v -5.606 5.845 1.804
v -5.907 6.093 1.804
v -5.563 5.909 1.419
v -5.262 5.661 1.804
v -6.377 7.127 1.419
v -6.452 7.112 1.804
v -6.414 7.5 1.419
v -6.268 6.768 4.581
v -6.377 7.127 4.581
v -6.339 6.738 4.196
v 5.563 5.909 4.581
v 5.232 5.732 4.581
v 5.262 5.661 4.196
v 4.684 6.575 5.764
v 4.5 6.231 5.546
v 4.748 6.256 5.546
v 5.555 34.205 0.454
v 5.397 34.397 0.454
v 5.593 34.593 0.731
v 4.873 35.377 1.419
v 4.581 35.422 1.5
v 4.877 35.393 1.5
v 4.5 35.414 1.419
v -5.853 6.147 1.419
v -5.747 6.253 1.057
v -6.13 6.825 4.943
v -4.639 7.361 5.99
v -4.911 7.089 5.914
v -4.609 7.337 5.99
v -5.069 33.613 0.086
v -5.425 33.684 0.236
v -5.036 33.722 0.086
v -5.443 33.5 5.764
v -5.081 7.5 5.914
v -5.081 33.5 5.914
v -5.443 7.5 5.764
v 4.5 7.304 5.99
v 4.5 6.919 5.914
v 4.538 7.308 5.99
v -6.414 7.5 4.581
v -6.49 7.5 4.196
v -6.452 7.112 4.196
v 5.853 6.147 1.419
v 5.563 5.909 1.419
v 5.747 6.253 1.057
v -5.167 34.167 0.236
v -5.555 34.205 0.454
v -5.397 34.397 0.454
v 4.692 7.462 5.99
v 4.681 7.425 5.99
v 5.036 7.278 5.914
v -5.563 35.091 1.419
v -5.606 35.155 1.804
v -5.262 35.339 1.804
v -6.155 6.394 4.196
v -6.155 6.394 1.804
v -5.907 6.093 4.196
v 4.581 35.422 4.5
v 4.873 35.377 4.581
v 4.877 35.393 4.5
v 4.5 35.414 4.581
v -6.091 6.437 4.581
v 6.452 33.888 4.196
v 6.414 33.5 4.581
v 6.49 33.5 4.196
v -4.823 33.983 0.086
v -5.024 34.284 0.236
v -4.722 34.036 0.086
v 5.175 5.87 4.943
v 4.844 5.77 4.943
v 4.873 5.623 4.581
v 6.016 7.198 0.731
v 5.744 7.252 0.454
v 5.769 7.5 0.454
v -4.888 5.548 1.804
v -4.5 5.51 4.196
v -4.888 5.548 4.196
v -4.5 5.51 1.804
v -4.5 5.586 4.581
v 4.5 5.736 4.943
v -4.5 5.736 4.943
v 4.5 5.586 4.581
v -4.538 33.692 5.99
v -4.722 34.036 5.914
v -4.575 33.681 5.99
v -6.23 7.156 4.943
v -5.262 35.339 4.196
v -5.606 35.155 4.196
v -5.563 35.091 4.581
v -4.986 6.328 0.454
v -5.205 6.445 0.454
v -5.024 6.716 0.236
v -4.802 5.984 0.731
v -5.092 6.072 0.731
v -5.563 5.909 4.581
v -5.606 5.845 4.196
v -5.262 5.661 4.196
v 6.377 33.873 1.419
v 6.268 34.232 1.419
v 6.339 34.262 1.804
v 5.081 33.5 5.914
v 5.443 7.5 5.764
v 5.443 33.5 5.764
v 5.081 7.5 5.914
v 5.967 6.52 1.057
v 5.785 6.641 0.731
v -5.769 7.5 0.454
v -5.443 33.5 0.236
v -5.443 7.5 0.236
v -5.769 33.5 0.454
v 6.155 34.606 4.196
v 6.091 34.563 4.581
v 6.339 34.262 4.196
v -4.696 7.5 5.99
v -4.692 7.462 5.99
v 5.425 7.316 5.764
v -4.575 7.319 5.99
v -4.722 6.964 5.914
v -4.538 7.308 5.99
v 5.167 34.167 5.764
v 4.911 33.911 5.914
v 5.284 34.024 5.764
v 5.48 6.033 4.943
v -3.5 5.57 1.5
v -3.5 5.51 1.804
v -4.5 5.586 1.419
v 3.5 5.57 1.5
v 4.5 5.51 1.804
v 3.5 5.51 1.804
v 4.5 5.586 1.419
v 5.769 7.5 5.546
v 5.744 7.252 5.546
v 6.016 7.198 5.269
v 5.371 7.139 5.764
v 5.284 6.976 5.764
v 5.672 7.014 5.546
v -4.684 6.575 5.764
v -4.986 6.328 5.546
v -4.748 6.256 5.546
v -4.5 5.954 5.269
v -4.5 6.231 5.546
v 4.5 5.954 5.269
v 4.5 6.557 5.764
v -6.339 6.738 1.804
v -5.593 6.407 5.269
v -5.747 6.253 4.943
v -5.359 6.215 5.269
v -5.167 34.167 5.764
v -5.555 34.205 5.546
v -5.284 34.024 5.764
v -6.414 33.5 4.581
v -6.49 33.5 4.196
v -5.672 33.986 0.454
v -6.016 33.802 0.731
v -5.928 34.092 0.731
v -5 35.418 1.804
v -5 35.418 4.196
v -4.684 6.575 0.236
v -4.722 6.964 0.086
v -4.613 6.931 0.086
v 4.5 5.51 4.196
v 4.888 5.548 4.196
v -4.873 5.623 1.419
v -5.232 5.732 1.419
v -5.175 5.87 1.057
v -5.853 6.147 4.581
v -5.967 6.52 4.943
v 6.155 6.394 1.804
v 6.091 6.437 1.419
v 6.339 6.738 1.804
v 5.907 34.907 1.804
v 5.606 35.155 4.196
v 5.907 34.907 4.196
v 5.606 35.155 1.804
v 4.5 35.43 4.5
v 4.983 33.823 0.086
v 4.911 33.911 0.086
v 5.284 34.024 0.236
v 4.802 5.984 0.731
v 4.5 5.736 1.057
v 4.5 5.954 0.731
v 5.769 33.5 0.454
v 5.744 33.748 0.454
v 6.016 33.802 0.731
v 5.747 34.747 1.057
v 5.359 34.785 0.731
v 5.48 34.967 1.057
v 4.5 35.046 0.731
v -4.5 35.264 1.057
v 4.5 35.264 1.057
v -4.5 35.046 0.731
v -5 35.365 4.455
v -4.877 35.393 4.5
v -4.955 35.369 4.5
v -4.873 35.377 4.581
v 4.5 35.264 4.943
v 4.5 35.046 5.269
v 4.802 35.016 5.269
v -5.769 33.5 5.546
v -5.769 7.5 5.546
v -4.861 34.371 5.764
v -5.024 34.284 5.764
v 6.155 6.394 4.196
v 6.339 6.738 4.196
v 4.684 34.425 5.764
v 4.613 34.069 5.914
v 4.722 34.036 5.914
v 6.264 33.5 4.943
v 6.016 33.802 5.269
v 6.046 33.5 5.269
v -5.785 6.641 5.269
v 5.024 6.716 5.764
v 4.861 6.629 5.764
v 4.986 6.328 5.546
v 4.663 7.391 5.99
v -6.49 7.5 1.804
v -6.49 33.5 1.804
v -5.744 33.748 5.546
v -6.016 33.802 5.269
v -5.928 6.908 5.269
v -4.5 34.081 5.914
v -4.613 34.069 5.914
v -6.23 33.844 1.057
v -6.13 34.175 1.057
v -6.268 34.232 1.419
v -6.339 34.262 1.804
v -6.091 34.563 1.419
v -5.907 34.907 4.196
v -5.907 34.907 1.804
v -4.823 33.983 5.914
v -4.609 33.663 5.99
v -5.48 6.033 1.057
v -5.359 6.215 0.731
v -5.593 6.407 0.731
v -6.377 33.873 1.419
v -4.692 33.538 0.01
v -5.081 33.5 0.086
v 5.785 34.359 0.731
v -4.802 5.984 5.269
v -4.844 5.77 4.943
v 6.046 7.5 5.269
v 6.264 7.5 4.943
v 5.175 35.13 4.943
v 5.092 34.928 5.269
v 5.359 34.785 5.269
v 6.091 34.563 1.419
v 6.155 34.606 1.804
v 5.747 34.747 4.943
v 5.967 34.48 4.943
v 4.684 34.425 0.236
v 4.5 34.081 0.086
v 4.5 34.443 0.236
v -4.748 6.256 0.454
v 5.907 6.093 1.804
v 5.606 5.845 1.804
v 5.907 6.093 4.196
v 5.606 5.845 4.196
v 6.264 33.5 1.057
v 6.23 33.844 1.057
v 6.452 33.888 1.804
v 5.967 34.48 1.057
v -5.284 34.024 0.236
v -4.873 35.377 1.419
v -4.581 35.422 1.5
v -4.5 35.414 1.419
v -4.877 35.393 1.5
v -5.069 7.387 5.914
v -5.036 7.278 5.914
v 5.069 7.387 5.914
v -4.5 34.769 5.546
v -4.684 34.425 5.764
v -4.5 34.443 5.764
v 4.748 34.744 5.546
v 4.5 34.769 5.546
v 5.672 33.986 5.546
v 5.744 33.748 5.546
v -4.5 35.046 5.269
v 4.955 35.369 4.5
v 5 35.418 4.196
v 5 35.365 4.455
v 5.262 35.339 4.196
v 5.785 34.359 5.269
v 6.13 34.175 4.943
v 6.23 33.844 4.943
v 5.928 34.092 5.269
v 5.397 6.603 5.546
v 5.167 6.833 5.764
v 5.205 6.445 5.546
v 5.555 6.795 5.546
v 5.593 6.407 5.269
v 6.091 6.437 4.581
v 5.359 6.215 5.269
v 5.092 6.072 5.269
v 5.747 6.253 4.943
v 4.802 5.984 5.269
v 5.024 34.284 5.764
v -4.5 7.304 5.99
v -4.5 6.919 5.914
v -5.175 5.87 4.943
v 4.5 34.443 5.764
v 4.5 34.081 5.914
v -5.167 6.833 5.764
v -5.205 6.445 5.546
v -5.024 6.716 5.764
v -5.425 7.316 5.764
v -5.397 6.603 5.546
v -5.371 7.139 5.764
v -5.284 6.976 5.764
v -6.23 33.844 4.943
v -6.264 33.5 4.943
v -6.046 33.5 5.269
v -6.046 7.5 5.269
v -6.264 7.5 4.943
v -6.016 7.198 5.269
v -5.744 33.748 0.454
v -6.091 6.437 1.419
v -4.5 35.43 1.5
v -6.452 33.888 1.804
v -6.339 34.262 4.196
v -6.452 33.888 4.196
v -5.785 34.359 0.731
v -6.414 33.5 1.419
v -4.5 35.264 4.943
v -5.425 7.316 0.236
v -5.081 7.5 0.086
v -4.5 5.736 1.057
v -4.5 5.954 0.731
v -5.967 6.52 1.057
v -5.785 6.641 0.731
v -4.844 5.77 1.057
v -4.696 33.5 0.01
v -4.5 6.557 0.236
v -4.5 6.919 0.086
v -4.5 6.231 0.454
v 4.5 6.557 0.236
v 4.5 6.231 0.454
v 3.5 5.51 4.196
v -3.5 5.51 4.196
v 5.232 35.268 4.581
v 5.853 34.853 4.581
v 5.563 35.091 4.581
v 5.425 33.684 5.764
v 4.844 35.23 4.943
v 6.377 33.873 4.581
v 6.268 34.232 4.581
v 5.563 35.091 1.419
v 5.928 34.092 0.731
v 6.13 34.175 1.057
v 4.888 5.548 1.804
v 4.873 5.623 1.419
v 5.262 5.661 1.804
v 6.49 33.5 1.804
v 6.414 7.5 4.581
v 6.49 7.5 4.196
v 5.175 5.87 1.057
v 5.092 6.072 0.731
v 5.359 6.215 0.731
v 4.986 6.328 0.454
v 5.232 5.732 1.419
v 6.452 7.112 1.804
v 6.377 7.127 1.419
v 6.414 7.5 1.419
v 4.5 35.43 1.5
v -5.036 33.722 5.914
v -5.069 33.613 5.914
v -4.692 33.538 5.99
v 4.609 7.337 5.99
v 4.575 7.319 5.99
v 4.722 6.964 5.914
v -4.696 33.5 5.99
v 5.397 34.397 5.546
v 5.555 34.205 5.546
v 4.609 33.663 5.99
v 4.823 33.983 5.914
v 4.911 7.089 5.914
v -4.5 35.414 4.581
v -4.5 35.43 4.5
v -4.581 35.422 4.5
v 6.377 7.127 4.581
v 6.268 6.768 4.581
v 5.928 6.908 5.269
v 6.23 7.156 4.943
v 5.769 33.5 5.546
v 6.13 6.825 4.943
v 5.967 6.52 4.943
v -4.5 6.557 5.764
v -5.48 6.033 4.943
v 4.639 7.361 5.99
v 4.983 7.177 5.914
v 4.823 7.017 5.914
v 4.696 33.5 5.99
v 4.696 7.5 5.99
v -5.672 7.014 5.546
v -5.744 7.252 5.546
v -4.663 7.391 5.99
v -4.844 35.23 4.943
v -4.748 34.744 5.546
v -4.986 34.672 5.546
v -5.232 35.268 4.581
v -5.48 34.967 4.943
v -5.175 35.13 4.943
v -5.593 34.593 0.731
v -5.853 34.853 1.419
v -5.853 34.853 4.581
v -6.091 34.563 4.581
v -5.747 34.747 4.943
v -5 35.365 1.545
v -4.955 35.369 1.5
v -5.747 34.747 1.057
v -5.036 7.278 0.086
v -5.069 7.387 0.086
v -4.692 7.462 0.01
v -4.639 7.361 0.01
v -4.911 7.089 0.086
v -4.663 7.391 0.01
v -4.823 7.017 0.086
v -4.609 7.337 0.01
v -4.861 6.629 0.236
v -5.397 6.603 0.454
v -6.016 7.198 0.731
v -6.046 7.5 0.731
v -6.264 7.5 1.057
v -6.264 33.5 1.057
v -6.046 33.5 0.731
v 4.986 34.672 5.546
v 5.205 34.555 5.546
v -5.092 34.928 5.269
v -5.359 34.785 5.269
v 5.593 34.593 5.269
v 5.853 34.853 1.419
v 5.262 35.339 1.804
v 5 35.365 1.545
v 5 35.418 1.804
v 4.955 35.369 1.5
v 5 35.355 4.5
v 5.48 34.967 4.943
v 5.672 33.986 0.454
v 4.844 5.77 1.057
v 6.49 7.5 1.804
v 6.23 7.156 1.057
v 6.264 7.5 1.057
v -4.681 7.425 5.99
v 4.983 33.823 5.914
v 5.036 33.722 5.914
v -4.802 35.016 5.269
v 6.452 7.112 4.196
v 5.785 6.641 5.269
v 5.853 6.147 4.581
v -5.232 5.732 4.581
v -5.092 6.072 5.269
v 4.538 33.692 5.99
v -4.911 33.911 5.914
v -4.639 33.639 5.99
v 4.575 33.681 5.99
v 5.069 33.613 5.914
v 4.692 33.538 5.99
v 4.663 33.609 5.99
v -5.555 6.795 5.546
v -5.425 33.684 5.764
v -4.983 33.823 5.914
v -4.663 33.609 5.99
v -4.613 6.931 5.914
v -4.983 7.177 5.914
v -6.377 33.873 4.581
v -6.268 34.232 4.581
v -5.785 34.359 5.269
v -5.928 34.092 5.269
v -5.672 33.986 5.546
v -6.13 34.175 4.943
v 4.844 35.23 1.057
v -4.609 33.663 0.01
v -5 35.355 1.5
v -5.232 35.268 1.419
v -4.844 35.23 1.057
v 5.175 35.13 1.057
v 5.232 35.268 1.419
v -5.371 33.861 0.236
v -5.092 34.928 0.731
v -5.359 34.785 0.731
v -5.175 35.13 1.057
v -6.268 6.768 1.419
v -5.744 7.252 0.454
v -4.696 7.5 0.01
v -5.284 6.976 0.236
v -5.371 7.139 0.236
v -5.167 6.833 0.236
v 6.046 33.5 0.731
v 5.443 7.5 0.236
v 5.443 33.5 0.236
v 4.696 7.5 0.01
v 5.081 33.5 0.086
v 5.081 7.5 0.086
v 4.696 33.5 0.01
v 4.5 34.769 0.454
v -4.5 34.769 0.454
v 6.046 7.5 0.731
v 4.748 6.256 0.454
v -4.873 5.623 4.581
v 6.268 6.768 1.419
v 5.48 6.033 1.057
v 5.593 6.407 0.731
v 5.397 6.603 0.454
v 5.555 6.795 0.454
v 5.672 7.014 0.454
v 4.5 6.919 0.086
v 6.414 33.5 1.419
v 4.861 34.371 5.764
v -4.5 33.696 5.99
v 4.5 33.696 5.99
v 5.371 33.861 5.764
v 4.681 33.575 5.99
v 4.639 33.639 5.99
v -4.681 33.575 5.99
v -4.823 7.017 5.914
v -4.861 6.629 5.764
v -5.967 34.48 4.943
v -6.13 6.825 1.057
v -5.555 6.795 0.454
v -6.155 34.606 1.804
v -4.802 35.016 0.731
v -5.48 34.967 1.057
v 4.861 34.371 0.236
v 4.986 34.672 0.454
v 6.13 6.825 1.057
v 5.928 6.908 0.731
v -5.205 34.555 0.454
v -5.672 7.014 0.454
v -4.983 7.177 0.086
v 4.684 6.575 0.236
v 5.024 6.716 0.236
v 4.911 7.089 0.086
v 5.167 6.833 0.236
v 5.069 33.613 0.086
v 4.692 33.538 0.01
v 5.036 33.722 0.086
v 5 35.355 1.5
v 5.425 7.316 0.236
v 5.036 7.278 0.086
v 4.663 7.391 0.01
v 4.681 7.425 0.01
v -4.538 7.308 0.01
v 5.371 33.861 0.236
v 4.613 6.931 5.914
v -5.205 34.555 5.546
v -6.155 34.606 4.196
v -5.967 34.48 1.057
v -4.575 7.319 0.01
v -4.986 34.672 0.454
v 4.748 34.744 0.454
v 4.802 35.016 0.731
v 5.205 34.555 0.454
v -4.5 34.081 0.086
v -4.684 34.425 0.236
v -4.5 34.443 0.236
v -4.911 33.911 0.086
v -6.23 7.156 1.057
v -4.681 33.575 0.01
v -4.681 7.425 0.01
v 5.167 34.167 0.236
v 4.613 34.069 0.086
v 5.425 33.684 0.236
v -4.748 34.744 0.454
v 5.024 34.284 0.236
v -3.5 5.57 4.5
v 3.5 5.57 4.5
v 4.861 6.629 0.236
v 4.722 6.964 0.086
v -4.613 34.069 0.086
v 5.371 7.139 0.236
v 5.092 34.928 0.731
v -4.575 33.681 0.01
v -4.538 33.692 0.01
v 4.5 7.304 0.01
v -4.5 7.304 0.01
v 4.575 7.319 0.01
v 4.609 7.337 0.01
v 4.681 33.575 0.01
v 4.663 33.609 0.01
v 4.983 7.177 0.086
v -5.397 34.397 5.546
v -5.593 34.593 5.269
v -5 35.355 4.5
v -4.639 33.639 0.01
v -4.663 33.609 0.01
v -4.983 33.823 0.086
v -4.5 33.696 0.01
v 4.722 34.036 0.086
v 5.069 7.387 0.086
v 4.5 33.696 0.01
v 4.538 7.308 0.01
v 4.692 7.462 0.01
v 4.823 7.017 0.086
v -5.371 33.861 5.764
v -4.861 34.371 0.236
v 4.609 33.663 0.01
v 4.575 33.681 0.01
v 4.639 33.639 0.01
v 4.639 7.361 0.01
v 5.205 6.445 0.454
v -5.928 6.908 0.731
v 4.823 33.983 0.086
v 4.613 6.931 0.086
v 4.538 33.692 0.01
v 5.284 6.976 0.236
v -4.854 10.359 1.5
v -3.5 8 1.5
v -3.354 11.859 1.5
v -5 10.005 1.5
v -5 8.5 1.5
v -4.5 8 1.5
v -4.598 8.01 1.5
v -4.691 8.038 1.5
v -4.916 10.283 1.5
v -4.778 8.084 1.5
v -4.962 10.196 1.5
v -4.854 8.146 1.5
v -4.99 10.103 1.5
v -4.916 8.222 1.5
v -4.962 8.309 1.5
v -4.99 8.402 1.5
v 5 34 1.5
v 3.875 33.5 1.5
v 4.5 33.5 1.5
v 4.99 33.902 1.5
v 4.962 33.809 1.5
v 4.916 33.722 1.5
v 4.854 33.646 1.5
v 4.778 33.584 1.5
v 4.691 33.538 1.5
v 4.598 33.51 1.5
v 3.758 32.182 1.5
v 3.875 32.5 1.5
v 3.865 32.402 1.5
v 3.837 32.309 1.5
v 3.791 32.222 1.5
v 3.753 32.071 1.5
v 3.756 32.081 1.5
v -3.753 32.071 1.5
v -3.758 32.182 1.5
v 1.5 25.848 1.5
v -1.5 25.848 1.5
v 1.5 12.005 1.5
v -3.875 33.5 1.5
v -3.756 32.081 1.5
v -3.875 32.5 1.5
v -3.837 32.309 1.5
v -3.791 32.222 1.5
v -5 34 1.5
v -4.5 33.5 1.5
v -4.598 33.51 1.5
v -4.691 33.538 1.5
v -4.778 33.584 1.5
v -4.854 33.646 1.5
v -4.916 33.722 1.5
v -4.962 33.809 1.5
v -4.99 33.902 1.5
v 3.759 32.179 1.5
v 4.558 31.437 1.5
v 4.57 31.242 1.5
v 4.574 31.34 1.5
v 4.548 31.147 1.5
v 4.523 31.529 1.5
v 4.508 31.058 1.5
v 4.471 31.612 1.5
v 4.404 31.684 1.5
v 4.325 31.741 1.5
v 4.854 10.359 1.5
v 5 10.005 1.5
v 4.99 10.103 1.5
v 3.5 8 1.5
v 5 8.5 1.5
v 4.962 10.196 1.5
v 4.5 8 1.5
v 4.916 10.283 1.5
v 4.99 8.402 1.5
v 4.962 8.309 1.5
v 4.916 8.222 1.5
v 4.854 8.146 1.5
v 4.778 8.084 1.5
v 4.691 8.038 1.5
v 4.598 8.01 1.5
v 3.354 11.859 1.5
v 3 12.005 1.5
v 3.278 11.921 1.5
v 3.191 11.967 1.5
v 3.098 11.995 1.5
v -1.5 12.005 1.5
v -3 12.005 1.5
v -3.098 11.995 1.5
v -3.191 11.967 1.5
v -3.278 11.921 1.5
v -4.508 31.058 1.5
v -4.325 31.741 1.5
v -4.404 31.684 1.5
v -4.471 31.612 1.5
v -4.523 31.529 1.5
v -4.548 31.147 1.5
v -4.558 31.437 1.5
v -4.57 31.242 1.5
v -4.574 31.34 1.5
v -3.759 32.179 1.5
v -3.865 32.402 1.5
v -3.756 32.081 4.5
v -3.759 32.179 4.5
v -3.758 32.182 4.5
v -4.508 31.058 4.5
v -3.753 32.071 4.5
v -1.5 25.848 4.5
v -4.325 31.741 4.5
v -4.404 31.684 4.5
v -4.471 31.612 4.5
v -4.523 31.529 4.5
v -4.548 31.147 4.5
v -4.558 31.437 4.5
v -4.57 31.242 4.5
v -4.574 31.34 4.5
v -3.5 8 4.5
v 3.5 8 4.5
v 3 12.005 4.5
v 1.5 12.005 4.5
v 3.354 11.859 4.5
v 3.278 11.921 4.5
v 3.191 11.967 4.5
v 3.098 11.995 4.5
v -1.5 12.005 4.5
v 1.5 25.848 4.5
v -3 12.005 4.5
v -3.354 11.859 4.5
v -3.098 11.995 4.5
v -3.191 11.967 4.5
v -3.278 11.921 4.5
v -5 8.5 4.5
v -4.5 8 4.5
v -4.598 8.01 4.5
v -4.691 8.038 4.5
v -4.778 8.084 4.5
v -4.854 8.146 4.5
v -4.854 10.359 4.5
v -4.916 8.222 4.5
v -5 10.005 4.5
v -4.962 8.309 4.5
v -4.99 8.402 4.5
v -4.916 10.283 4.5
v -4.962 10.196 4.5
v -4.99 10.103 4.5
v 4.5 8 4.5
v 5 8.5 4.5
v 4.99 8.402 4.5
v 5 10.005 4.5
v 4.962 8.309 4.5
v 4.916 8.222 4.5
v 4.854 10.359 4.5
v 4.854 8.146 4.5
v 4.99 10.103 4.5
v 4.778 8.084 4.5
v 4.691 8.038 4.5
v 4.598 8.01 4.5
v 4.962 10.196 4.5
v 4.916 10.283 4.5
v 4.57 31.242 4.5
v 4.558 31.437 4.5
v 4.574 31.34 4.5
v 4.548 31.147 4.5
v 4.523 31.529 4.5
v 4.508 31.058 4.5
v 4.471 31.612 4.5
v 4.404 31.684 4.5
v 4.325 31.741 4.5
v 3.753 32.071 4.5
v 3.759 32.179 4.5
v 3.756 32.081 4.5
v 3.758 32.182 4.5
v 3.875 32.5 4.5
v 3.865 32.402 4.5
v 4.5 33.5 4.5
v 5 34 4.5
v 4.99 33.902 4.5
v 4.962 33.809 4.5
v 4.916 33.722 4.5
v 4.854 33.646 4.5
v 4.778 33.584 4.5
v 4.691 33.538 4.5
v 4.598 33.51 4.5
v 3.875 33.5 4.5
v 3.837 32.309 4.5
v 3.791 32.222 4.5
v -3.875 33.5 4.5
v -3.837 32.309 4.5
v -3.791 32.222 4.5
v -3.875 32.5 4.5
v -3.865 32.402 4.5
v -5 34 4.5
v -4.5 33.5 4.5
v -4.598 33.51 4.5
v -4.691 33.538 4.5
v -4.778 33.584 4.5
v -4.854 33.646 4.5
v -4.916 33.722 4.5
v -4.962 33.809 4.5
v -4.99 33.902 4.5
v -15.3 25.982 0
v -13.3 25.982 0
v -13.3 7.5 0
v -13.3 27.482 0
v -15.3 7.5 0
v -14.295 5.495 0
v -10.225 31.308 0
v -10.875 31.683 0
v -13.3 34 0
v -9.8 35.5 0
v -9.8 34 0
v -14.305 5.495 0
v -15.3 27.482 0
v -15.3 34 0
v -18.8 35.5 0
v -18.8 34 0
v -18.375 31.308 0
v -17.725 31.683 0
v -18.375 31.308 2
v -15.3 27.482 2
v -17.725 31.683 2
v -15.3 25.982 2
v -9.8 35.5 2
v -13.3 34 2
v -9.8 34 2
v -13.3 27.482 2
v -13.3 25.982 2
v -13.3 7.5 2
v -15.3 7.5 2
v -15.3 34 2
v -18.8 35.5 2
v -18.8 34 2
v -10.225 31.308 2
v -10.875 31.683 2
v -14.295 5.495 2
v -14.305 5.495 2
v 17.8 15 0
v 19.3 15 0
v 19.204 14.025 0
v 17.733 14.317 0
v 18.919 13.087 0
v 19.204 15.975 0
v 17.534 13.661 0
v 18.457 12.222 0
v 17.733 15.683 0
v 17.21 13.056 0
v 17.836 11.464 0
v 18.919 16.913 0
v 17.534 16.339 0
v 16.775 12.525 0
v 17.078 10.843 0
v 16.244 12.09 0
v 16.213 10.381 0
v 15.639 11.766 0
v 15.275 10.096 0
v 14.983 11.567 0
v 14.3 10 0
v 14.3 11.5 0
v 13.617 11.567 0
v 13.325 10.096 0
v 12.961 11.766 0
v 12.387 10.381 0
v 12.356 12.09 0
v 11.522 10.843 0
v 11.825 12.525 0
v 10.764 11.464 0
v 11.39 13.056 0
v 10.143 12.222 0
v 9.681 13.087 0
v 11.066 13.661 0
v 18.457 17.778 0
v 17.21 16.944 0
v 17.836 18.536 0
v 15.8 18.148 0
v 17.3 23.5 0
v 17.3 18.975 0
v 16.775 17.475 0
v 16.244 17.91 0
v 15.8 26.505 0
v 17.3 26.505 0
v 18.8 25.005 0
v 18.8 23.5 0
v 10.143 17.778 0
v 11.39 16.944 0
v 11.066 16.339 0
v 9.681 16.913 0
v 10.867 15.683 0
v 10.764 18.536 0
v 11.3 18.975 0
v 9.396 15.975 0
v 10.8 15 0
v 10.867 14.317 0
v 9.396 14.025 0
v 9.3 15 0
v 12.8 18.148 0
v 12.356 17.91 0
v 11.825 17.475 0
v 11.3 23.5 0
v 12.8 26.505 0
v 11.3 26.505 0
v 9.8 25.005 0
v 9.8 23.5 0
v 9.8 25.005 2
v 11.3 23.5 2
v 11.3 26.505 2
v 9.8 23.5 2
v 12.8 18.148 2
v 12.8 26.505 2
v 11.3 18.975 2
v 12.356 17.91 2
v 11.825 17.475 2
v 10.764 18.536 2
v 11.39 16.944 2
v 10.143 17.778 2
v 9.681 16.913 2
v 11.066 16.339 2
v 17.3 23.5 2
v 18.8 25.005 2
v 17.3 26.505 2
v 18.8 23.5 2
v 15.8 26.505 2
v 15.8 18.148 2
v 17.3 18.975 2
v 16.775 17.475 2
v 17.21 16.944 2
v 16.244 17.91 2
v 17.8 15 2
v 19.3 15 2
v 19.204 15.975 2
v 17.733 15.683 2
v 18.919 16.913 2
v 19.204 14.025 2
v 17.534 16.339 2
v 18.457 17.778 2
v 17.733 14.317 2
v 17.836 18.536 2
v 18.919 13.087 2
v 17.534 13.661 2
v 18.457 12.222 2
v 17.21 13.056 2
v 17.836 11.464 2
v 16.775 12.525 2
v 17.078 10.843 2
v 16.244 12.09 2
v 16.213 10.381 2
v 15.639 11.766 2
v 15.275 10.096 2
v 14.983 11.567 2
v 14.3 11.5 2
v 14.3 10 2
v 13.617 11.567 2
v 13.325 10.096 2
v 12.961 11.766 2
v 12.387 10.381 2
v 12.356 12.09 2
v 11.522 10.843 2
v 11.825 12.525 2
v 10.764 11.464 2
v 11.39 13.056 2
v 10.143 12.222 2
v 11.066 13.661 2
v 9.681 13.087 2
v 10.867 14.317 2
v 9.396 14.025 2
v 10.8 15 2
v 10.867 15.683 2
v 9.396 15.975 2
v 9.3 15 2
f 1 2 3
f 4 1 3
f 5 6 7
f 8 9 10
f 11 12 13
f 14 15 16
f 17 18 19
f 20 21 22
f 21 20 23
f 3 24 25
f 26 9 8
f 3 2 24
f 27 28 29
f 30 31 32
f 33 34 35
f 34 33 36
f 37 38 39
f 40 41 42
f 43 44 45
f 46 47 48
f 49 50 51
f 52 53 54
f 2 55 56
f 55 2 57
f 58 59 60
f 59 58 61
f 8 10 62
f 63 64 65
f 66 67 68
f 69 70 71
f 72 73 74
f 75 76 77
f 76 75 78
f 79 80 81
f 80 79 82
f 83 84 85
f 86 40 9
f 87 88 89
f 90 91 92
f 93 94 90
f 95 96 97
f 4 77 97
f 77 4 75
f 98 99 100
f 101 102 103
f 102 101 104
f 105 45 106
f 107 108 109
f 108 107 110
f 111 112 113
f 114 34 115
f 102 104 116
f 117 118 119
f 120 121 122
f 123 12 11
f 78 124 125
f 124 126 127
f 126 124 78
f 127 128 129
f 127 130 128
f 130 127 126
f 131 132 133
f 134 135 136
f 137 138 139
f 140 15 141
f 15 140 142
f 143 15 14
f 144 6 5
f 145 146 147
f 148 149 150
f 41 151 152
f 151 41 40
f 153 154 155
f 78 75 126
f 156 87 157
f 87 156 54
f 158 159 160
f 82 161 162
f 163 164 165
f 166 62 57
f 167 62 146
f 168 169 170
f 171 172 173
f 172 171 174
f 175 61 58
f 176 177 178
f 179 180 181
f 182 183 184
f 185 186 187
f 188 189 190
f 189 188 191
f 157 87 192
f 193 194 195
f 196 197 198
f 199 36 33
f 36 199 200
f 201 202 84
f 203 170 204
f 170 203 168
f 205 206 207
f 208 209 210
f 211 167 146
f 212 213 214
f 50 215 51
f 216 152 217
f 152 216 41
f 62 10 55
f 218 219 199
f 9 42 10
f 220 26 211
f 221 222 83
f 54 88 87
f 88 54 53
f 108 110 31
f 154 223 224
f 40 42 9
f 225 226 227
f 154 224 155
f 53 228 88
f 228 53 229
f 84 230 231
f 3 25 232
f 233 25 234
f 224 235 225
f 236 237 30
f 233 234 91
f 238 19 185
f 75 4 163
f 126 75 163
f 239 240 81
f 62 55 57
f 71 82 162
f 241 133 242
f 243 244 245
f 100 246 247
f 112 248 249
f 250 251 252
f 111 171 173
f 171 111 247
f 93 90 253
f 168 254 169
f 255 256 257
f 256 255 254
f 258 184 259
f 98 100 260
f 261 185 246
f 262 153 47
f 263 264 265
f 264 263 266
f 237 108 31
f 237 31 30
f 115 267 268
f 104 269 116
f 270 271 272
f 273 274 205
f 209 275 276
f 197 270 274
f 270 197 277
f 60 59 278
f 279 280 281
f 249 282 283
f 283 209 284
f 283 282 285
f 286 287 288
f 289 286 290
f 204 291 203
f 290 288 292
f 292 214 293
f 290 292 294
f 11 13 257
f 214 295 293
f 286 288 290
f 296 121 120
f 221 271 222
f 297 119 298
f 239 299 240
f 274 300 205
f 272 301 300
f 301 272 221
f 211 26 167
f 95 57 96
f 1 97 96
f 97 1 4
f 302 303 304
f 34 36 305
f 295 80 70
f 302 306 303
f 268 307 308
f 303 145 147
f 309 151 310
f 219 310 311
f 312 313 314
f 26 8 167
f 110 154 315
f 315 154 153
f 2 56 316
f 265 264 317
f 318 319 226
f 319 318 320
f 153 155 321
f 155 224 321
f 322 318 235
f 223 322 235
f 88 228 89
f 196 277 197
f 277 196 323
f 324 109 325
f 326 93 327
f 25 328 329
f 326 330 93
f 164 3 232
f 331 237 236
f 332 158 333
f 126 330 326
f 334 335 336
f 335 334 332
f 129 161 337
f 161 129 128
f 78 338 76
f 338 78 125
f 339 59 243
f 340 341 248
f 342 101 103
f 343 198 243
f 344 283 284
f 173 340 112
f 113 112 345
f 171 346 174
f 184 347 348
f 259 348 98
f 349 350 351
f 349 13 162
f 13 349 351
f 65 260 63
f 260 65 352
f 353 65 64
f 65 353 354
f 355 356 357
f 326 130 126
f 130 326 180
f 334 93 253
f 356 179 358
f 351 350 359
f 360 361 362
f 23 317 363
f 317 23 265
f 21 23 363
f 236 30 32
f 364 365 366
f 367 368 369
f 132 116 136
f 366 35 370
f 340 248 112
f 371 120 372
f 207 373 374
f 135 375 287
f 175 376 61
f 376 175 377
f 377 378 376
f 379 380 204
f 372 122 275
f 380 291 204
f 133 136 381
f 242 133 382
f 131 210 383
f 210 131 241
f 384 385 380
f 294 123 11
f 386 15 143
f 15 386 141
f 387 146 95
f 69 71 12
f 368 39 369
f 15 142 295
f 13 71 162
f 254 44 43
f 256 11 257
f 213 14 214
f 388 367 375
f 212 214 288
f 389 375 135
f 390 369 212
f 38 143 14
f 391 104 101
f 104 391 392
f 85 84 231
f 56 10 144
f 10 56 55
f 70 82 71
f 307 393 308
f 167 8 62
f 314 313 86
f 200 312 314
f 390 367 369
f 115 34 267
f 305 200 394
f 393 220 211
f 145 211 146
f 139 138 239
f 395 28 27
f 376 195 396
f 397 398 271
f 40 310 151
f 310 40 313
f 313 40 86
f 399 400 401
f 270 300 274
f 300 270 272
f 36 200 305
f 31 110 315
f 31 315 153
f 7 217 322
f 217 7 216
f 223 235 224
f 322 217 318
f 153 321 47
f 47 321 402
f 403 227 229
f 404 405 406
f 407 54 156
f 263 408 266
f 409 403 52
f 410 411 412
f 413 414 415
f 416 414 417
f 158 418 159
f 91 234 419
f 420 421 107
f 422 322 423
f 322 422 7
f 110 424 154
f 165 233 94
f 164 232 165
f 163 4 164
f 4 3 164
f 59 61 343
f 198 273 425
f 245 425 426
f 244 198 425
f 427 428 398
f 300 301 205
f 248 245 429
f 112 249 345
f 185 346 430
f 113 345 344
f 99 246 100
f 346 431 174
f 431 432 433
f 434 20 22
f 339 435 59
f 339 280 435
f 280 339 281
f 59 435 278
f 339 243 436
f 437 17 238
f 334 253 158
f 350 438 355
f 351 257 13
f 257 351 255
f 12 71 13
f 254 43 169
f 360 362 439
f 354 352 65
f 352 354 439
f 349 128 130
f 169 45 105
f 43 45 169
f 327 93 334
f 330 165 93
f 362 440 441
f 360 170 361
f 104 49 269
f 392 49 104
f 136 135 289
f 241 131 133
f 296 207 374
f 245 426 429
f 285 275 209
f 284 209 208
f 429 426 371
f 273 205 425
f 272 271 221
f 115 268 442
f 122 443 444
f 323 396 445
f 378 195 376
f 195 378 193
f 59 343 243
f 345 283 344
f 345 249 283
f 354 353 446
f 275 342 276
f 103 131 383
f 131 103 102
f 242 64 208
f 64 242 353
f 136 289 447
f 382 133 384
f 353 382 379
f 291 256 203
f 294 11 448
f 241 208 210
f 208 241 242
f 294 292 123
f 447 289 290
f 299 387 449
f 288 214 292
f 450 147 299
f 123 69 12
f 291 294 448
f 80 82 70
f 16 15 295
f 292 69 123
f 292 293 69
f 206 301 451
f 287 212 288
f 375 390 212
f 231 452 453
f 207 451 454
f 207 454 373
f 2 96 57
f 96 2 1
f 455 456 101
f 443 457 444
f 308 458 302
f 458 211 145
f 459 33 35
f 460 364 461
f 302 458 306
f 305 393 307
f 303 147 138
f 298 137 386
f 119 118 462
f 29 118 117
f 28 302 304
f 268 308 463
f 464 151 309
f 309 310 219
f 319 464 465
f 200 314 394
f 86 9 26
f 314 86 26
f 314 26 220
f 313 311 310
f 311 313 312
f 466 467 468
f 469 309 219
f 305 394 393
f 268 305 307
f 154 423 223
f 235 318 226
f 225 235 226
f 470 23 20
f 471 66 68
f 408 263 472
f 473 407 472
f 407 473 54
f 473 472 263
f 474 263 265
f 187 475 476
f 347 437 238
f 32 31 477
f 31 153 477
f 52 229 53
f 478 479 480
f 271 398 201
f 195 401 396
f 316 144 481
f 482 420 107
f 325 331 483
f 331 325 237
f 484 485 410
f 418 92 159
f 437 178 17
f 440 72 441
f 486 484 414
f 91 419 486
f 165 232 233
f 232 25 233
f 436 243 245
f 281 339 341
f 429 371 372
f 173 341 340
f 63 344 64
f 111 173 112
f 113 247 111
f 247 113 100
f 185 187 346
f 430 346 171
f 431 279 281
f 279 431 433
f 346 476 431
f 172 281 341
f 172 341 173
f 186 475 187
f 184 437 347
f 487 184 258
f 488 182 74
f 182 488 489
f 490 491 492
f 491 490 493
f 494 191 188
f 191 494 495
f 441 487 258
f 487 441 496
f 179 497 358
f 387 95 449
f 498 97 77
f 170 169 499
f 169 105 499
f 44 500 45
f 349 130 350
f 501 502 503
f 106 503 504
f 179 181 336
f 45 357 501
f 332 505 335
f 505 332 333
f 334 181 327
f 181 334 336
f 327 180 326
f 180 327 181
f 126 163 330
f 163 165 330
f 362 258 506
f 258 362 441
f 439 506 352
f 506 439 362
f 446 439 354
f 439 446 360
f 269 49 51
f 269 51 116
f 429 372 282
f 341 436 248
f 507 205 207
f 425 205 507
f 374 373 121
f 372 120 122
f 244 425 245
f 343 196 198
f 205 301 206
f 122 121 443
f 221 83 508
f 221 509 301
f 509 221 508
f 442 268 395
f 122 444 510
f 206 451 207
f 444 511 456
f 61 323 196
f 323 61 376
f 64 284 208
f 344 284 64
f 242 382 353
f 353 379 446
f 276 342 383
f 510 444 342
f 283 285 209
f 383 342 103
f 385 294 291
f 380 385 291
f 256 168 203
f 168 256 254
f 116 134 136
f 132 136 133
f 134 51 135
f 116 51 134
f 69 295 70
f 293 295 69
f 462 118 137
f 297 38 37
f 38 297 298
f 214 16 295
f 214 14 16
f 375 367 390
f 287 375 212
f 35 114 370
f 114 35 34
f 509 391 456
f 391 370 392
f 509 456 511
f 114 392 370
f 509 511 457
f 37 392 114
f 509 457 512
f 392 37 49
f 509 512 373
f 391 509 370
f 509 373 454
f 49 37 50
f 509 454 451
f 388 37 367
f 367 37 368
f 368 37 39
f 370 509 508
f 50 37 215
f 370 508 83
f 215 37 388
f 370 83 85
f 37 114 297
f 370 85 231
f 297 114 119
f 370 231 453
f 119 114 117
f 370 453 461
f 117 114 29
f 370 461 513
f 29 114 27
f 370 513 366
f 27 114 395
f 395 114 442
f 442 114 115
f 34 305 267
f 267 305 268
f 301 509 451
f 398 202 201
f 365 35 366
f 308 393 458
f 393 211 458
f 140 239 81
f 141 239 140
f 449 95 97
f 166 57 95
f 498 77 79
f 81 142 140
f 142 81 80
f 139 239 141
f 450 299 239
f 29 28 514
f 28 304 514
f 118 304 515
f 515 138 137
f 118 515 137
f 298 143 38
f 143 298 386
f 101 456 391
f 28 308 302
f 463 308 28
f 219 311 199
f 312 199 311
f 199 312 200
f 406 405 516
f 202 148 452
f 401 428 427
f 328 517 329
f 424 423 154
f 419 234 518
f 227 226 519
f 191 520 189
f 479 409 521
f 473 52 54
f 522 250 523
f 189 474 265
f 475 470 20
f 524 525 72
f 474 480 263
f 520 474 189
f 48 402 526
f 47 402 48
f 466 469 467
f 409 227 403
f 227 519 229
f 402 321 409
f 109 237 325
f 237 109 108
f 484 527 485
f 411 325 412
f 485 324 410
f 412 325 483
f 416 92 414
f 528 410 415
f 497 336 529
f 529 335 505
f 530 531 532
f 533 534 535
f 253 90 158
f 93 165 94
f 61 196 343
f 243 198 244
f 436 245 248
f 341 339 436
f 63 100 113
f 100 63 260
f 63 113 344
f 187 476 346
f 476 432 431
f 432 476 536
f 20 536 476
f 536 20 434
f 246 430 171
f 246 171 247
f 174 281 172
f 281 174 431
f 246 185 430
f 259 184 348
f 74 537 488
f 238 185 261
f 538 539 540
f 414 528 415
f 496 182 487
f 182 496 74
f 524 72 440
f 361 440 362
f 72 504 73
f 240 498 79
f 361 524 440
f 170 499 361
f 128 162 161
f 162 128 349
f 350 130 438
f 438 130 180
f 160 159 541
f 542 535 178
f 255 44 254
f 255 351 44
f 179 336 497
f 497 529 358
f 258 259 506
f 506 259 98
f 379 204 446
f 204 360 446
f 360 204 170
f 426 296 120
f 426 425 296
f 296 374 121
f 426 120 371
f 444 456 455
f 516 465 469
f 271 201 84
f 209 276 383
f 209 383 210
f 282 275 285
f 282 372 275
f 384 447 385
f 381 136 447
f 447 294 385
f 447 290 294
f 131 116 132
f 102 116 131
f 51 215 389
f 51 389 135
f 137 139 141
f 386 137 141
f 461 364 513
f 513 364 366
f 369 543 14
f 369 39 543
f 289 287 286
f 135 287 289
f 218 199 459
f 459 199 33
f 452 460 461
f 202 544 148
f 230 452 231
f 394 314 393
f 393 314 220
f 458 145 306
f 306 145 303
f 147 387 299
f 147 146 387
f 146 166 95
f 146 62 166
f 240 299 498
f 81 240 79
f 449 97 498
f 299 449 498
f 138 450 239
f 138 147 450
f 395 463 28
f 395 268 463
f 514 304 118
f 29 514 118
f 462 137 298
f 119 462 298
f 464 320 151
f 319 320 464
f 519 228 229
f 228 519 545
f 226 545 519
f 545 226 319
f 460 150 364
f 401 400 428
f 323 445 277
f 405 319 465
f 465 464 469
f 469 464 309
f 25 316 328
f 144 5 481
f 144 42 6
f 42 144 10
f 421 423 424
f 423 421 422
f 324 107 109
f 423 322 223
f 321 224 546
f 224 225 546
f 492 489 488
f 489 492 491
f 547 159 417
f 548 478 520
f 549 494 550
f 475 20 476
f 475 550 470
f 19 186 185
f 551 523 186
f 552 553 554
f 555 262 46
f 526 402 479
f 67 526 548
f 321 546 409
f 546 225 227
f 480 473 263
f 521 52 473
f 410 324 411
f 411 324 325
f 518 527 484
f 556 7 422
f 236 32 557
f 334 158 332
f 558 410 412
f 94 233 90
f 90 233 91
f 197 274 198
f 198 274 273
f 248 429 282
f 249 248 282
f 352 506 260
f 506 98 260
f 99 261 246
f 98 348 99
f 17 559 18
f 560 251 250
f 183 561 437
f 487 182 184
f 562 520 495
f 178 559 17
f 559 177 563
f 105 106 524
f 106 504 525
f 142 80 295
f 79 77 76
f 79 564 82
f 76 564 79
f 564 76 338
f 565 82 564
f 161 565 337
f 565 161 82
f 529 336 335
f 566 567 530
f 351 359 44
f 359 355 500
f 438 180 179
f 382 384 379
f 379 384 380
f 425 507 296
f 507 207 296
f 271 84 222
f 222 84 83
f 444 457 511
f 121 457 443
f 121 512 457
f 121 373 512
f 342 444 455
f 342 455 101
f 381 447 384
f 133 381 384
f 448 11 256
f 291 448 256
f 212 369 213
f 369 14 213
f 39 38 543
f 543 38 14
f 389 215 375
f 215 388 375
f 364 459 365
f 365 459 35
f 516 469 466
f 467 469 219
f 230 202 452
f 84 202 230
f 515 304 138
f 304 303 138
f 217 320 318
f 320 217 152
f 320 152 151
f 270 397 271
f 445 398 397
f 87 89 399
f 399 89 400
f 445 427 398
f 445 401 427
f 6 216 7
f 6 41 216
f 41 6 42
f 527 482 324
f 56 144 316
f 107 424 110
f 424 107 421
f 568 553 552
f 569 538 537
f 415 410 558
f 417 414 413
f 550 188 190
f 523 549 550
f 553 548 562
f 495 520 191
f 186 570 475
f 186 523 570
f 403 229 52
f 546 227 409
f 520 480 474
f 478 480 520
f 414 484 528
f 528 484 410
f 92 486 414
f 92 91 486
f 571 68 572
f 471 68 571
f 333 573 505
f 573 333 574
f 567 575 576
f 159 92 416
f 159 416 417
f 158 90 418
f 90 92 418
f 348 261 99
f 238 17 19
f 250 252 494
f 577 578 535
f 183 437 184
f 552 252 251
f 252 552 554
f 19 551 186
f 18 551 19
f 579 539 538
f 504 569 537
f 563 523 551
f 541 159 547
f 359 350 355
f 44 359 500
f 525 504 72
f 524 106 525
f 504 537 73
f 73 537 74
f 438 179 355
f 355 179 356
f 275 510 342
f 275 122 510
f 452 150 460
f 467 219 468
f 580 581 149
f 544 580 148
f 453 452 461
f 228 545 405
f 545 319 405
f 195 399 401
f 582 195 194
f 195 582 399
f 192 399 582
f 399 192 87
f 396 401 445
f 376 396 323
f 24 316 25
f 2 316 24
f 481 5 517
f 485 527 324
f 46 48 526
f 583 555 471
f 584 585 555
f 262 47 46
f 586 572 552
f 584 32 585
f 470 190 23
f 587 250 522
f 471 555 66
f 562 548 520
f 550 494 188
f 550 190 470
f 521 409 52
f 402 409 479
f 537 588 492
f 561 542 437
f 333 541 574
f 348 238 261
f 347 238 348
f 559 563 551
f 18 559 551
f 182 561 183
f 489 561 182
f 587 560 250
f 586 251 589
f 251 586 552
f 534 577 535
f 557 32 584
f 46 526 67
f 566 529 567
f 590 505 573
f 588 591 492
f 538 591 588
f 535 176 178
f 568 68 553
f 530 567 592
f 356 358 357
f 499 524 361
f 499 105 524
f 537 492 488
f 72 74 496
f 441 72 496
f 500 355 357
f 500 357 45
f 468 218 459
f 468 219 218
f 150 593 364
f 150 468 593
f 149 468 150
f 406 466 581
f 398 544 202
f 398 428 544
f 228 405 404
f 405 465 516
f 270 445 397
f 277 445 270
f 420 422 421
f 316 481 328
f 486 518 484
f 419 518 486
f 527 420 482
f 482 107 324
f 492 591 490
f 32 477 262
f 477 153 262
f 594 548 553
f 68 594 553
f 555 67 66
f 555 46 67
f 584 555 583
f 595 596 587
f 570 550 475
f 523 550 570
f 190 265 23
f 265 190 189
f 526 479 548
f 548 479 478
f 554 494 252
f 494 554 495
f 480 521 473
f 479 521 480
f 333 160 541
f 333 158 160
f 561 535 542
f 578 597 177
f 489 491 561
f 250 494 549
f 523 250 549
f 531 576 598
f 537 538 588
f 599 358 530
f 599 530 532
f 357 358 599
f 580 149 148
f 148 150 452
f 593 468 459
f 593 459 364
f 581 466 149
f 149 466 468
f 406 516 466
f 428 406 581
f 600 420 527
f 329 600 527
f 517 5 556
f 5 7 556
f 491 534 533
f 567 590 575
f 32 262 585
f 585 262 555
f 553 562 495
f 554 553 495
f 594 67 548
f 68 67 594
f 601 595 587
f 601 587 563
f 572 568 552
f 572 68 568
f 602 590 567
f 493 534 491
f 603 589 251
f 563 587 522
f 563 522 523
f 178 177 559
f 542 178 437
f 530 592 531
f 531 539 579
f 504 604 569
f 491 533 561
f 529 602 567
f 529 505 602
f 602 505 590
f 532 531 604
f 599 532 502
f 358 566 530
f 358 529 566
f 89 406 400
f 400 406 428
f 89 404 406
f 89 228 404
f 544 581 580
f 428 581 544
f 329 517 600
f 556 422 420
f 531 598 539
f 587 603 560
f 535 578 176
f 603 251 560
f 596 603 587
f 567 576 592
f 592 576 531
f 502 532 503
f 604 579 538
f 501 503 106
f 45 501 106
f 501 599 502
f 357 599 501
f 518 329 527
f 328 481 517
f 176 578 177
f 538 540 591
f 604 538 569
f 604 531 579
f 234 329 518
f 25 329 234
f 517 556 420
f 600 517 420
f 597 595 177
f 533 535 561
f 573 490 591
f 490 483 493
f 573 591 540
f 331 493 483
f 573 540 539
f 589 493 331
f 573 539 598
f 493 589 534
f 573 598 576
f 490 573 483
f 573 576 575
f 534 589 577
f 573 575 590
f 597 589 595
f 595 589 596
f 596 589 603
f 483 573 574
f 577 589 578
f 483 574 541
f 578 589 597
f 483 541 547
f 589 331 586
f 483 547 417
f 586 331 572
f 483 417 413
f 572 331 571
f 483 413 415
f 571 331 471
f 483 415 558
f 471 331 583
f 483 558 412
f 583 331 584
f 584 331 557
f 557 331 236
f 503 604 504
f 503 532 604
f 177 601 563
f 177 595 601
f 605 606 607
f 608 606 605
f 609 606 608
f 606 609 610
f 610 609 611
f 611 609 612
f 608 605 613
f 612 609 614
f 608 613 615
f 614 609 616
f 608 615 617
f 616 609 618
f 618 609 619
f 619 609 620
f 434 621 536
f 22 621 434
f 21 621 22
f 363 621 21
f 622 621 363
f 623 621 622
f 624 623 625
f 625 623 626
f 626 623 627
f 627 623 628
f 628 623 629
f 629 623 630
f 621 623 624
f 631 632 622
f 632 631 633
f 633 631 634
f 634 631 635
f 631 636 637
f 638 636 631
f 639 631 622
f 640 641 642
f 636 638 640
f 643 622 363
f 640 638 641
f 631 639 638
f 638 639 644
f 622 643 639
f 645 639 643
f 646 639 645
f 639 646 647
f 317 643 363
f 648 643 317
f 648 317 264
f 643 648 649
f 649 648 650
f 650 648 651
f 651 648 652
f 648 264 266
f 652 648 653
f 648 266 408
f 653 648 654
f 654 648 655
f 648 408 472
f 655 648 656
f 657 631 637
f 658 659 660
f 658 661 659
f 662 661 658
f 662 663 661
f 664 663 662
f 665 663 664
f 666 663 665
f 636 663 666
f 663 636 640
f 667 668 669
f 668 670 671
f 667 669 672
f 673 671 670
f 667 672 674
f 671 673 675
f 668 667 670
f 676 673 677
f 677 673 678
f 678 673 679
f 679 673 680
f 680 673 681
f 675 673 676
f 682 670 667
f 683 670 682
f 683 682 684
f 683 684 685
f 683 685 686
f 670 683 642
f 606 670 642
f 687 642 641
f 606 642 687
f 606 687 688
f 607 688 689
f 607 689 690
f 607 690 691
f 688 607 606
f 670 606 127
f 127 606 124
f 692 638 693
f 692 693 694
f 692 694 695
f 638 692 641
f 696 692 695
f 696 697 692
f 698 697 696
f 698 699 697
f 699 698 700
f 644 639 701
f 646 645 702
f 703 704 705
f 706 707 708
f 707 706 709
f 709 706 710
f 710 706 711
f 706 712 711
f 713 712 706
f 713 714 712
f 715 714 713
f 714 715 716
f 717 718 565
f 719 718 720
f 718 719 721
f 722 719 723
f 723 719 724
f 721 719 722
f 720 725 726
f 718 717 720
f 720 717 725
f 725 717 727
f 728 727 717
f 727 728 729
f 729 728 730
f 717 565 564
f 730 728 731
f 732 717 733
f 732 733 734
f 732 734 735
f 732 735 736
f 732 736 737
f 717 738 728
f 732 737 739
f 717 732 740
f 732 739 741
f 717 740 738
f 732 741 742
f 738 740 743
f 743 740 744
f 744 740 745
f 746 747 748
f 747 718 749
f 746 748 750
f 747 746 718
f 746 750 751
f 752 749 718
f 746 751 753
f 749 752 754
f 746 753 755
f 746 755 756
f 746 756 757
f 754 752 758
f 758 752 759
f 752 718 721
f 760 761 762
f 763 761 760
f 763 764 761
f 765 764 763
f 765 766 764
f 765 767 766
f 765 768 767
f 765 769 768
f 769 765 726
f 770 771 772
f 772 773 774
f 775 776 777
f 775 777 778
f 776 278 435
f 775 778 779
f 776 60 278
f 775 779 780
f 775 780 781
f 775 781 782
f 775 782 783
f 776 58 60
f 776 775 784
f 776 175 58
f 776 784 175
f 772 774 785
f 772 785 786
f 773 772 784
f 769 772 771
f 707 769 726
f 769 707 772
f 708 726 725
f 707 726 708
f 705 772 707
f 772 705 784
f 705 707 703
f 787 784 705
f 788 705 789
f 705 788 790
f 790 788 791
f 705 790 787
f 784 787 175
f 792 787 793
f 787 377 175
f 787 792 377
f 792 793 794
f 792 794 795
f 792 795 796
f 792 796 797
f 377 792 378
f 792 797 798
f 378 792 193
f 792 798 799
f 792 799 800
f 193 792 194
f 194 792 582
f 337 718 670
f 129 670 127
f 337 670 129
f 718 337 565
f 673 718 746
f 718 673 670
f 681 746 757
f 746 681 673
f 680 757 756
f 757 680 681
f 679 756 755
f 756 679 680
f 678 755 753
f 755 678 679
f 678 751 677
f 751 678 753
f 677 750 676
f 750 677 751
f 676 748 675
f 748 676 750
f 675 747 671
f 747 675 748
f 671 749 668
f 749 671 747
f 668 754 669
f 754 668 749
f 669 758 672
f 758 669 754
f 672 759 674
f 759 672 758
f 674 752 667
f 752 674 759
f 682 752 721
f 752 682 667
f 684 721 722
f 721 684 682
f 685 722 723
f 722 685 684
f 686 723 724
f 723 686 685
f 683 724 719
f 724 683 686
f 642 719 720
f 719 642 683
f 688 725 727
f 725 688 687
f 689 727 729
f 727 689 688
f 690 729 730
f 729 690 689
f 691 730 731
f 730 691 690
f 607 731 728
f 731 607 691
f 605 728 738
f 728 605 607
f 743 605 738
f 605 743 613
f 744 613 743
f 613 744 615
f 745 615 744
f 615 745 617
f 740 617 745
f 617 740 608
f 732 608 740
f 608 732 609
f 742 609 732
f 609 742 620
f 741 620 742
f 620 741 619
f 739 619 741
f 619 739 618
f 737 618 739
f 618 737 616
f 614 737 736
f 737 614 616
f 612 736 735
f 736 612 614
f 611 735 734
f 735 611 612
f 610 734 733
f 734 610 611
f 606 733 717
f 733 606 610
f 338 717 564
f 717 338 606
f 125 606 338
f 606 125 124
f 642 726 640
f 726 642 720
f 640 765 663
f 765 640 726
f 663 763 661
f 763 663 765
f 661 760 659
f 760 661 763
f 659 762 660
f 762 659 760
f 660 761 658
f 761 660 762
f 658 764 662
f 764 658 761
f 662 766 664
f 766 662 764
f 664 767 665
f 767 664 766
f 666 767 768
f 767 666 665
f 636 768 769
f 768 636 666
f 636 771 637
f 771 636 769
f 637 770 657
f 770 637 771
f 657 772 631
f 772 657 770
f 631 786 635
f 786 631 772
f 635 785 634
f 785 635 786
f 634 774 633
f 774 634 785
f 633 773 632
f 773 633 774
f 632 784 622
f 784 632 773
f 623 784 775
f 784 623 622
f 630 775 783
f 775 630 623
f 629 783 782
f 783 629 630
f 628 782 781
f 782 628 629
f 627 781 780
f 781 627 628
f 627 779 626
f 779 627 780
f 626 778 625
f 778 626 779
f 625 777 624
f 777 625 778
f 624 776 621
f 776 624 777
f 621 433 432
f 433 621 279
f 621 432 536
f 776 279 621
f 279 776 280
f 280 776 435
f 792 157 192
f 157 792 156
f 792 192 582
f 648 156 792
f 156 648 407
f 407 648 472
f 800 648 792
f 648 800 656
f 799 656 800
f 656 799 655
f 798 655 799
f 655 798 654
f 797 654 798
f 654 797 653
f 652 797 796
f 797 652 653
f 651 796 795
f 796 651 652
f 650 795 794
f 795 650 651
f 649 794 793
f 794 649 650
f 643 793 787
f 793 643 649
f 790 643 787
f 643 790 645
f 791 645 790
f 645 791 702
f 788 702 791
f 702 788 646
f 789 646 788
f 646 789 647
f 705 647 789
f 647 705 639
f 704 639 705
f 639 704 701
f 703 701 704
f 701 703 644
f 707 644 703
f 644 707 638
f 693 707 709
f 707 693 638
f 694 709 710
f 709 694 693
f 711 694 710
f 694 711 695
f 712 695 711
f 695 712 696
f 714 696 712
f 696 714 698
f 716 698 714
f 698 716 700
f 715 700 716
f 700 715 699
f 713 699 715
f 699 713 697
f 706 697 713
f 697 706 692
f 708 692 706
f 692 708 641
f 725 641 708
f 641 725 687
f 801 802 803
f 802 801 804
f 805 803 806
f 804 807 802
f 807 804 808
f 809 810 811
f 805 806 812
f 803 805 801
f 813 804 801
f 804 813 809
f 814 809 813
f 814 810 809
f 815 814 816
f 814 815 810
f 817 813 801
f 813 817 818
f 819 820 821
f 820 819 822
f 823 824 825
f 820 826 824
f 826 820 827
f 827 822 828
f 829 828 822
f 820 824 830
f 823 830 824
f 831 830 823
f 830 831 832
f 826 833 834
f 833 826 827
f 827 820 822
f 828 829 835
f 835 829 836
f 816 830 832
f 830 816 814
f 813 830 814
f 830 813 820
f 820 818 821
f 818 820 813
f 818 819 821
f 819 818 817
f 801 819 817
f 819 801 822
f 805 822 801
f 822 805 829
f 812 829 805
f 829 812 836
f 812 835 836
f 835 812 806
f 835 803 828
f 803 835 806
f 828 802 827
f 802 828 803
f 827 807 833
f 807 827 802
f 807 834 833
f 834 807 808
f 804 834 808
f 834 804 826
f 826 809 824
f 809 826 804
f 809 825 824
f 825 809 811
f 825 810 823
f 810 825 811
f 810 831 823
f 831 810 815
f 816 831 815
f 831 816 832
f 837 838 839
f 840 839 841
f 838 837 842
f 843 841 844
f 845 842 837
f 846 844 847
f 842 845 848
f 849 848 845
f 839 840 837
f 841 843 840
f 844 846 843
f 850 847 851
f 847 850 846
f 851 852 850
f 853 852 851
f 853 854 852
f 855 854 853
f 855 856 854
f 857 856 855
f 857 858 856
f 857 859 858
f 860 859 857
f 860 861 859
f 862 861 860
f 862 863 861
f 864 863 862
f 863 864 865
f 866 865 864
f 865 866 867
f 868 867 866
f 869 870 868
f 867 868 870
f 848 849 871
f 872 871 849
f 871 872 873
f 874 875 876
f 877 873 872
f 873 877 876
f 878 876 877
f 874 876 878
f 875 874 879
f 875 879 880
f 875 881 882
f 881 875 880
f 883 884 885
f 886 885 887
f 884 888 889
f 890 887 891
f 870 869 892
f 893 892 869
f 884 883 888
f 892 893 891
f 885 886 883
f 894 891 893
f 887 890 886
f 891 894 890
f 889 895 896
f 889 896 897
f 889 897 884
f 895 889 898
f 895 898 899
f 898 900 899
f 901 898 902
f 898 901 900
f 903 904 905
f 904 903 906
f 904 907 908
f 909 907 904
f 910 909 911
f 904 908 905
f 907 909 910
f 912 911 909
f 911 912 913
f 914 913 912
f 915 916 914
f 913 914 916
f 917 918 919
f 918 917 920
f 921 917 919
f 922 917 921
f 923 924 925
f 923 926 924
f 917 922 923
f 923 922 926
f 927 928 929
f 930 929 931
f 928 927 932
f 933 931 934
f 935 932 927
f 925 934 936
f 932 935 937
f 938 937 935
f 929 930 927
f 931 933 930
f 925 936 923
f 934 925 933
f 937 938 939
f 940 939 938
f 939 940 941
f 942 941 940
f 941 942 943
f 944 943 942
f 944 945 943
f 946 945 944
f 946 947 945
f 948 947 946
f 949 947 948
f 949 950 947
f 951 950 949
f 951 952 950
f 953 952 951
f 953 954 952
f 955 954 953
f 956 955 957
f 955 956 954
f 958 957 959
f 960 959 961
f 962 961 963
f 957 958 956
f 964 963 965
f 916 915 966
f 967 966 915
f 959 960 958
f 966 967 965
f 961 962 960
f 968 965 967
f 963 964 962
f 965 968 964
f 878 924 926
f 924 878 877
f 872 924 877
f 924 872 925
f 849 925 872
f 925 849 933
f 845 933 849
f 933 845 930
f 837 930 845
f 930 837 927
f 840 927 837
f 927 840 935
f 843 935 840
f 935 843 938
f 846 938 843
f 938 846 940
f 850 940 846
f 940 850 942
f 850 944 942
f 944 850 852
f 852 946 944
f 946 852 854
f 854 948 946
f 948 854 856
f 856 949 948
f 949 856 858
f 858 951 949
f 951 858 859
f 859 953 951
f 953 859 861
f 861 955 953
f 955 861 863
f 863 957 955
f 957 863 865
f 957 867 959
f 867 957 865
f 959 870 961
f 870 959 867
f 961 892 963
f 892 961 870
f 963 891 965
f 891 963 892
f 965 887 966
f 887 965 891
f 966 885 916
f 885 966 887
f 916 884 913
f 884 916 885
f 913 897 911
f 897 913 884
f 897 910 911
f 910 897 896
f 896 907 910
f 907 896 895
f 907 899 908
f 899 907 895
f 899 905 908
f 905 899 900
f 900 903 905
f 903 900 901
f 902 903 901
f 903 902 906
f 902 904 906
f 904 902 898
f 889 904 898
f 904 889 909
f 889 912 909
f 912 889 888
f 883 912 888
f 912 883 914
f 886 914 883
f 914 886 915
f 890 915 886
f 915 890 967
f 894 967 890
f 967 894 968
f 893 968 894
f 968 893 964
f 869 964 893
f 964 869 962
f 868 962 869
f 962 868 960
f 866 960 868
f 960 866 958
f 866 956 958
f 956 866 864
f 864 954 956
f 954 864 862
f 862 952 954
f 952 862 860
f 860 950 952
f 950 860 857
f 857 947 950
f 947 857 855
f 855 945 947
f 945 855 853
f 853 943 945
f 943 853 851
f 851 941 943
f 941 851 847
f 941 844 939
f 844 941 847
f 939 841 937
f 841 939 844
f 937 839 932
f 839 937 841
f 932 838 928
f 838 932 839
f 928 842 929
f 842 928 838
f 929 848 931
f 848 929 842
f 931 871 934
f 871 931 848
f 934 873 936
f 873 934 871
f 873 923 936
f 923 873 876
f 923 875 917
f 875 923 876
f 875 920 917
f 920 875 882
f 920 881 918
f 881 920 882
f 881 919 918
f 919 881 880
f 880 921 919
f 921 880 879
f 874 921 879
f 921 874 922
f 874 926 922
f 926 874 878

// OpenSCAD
// Parametric Zip Toggle V4: 25.11.2018
// As suggested by https://www.thingiverse.com/blackboots:
// Decreased default tolerance 
// 
// Parametric Zip Toggle V3: 23.11.2018
// As suggested by https://www.thingiverse.com/warr3ntor:
// Rendered parts lie flat on a common plane now 
// No artifacts at small thicknesses any more
// Customizer uses tabs now
//
// Parametric Zip Toggle V2: 22.11.2018
// Minor syntax correction, slight-arrangement of rendered parts
//
// Parametric Zip Toggle V1: 22.11.2018
// First release
//
// https://www.thingiverse.com/thing:3232726
// by https://www.thingiverse.com/Bikecyclist

/* [Loop] */

//Width of Loop
w_loop = 10;

// Length of Loop
l_loop = 10;

// Height of Loop
h_loop = 2;

// Thickness of Loop (and other Parts interfacing with the Loop)
th_loop = 1.5;

// End Radius of Loop
r_loop = (w_loop)/2;

// Gap in Loop
w_gap = 2 * th_loop;

// Width of Hook
w_hook = 4 * th_loop;

// Length of Hook
l_hook = 8;

/* [Grip] */

// Width of Grip
w_grip = 13;

// Lenght of Grip
l_grip = 30;

// Edge Radius of Grip
r_grip = 2;

/* [Tolerances] */

// Height Tolerance of Grip
h_tol = 0.5;

// Width Tolerance of Grip ... required value depends a lot on your printer
w_tol = 0.5;

/* [Technical] */

// Small distance to ensure proper meshing ... normally no need to change it
epsilon = 0.01;

// Number of facets
$fn = 32;

/* [Hidden] */

//Version number
version = "V4";

//cutdup (10, h_loop + epsilon)
{
    translate ([-1.1 * w_grip, 0, 0])
        key_part ();
    
    translate ([0, 0, th_loop + h_tol])
        grip_part ();

    translate ([1.1 * w_grip, l_grip/2, 0])
        loop_part ();
}

module loop_part ()
{
    color ("green")
        linear_extrude (h_loop, convexity = 8)
            hook_section ();
}

module grip_part ()
{
    translate ([0, 0, -h_tol])
        difference ()
        {
            translate ([0, l_loop/2 + l_hook - 5 * th_loop + l_grip/2, -th_loop])
                rcube ([w_grip, l_grip, h_loop + 2 * h_tol + 2 * th_loop], r_grip);
            
            translate ([0, l_loop/2 + l_hook - 4 * th_loop + l_grip/2 - epsilon, (h_loop + 2 * h_tol)/2 - th_loop])
                linear_extrude (h_loop + 2 * h_tol)
                    csquare ([w_hook - 2 * th_loop - 2 * w_tol, l_grip + 2 * epsilon]);
            
            linear_extrude (h_loop + 2 * h_tol, convexity = 8)
                offset (w_tol)
                    hook_section ();
            
            translate ([0, l_loop/2 + l_hook - 4 * th_loop - epsilon, 0])
                linear_extrude (h_loop + 2 * h_tol)
                    csquare ([w_hook - 2 * th_loop, 2 * th_loop]);
            
            linear_extrude (h_loop + 2 * h_tol, convexity = 8)
                offset (w_tol)
                    key_section ();
        }
}
        
module key_part ()
{    
    color ("red")
        linear_extrude (h_loop, convexity = 8)
            key_section (solid = false);
}


module key_section (solid = true)
{
    translate ([0, l_loop/2 + l_grip/2 + l_hook - 5 * th_loop, 0])
    {
        // "Needle" shape
        hull ()
        {
            translate ([0, 2 * w_tol])
                csquare ([2 * th_loop - 2 * w_tol, l_grip - 4 * w_tol]);
            
            translate ([0, -l_grip/2])
                csquare ([epsilon, epsilon]);
        }
        
        // Cutout near the end
        if (solid)
            translate ([0, l_grip/2 - th_loop])
                csquare ([4.5 * th_loop, 2 * th_loop]);
        
        // Cutout for the end cap
        translate ([0, l_grip/2 - th_loop/2])
            csquare ([6 * th_loop, th_loop]);
        
        // Barbs
        if (solid)
            union ()
            {
                hull ()
                    little_barbs ();
                
                translate ([0, 2 * th_loop])
                    scale ([0.8, 0.8, 0.8])
                        hull ()
                            little_barbs ();
            }
        else
            little_barbs ();
    }
        
}

module hook_section ()
{
    difference ()
    {
        rsquare ([w_loop, l_loop], r_loop);
        
        rsquare ([w_loop - 2 * th_loop, l_loop - 2 * th_loop, h_loop], r_loop - th_loop);

        translate ([0, l_hook/2, 0])
            csquare ([w_gap, l_hook]);
    }

    translate ([0, l_loop/2 - th_loop + l_hook/2, 0])
        barb_pair (l_hook);
}


module barb_pair (l_barb)
{
    difference ()
    {
        union ()
        {
            csquare ([w_hook, l_barb]);

            translate ([0, l_barb/2, 0])
                union ()
                {
                    hull ()
                    {
                        translate ([0, -th_loop])
                            csquare ([w_hook + 2 * th_loop, epsilon, h_loop]);
                        
                        csquare ([w_hook, epsilon, h_loop]);
                    }
                    translate ([0, -3/2 * th_loop])
                        csquare ([w_hook + 2 * th_loop, th_loop, h_loop]);
                }
        }
        
        csquare ([w_hook - 2 * th_loop, l_barb + 2 * epsilon, h_loop + 2 * epsilon]);
    }
}

module little_barbs ()
{
    for (i = [-1, 1])
        translate ([0, l_grip/2 - 7 * th_loop])
            rotate ([0, 0, i * 60])
                translate ([i * 5/2 * th_loop, 0])
                    csquare ([5 * th_loop, th_loop/2]);
}

module rsquare (dim, r = 0.001)
{
    if (r <= dim [0]/2 && r <= dim [1]/2)
        hull ()
            for (i = [-1, 1], j = [-1, 1])
                translate ([i * (dim[0]/2 - r), j * (dim[1]/2 - r), 0])
                    circle (r);
else
    echo ("rsquare: corner radius too large [r, dim]:", r, dim [0], dim [1]);
}

module csquare (dim)
{
    square ([dim [0], dim [1]], center = true);
}

module rcube (dim, r = 0.001)
{
    if (r <= dim [0]/2 && r <= dim [1]/2 && r <= dim [2]/2)
        hull ()
            for (i = [-1, 1], j = [-1, 1], k = [-1, 1])
                translate ([i * (dim[0]/2 - r), j * (dim[1]/2 - r), (k + 1) * (dim [2]/2 - r) + r])
                    sphere (r, $fn = 32);
else
    echo ("rcube: corner radius too large [r, dim]:", r, dim [0], dim [1], dim [2]);
}


module cutdup (d = 0, h = 0, a = 1000)
{
    translate ([0, 0, d])
        difference ()
        {
            children ();
            
            translate ([0, 0, h - a/2])
                cube ([a, a, a], center = true);
        }
    
    translate ([0, 0, -d])
        difference ()
        {
            children ();
            
            translate ([0, 0, h + a/2])
                cube ([a, a, a], center = true);
        }
}
